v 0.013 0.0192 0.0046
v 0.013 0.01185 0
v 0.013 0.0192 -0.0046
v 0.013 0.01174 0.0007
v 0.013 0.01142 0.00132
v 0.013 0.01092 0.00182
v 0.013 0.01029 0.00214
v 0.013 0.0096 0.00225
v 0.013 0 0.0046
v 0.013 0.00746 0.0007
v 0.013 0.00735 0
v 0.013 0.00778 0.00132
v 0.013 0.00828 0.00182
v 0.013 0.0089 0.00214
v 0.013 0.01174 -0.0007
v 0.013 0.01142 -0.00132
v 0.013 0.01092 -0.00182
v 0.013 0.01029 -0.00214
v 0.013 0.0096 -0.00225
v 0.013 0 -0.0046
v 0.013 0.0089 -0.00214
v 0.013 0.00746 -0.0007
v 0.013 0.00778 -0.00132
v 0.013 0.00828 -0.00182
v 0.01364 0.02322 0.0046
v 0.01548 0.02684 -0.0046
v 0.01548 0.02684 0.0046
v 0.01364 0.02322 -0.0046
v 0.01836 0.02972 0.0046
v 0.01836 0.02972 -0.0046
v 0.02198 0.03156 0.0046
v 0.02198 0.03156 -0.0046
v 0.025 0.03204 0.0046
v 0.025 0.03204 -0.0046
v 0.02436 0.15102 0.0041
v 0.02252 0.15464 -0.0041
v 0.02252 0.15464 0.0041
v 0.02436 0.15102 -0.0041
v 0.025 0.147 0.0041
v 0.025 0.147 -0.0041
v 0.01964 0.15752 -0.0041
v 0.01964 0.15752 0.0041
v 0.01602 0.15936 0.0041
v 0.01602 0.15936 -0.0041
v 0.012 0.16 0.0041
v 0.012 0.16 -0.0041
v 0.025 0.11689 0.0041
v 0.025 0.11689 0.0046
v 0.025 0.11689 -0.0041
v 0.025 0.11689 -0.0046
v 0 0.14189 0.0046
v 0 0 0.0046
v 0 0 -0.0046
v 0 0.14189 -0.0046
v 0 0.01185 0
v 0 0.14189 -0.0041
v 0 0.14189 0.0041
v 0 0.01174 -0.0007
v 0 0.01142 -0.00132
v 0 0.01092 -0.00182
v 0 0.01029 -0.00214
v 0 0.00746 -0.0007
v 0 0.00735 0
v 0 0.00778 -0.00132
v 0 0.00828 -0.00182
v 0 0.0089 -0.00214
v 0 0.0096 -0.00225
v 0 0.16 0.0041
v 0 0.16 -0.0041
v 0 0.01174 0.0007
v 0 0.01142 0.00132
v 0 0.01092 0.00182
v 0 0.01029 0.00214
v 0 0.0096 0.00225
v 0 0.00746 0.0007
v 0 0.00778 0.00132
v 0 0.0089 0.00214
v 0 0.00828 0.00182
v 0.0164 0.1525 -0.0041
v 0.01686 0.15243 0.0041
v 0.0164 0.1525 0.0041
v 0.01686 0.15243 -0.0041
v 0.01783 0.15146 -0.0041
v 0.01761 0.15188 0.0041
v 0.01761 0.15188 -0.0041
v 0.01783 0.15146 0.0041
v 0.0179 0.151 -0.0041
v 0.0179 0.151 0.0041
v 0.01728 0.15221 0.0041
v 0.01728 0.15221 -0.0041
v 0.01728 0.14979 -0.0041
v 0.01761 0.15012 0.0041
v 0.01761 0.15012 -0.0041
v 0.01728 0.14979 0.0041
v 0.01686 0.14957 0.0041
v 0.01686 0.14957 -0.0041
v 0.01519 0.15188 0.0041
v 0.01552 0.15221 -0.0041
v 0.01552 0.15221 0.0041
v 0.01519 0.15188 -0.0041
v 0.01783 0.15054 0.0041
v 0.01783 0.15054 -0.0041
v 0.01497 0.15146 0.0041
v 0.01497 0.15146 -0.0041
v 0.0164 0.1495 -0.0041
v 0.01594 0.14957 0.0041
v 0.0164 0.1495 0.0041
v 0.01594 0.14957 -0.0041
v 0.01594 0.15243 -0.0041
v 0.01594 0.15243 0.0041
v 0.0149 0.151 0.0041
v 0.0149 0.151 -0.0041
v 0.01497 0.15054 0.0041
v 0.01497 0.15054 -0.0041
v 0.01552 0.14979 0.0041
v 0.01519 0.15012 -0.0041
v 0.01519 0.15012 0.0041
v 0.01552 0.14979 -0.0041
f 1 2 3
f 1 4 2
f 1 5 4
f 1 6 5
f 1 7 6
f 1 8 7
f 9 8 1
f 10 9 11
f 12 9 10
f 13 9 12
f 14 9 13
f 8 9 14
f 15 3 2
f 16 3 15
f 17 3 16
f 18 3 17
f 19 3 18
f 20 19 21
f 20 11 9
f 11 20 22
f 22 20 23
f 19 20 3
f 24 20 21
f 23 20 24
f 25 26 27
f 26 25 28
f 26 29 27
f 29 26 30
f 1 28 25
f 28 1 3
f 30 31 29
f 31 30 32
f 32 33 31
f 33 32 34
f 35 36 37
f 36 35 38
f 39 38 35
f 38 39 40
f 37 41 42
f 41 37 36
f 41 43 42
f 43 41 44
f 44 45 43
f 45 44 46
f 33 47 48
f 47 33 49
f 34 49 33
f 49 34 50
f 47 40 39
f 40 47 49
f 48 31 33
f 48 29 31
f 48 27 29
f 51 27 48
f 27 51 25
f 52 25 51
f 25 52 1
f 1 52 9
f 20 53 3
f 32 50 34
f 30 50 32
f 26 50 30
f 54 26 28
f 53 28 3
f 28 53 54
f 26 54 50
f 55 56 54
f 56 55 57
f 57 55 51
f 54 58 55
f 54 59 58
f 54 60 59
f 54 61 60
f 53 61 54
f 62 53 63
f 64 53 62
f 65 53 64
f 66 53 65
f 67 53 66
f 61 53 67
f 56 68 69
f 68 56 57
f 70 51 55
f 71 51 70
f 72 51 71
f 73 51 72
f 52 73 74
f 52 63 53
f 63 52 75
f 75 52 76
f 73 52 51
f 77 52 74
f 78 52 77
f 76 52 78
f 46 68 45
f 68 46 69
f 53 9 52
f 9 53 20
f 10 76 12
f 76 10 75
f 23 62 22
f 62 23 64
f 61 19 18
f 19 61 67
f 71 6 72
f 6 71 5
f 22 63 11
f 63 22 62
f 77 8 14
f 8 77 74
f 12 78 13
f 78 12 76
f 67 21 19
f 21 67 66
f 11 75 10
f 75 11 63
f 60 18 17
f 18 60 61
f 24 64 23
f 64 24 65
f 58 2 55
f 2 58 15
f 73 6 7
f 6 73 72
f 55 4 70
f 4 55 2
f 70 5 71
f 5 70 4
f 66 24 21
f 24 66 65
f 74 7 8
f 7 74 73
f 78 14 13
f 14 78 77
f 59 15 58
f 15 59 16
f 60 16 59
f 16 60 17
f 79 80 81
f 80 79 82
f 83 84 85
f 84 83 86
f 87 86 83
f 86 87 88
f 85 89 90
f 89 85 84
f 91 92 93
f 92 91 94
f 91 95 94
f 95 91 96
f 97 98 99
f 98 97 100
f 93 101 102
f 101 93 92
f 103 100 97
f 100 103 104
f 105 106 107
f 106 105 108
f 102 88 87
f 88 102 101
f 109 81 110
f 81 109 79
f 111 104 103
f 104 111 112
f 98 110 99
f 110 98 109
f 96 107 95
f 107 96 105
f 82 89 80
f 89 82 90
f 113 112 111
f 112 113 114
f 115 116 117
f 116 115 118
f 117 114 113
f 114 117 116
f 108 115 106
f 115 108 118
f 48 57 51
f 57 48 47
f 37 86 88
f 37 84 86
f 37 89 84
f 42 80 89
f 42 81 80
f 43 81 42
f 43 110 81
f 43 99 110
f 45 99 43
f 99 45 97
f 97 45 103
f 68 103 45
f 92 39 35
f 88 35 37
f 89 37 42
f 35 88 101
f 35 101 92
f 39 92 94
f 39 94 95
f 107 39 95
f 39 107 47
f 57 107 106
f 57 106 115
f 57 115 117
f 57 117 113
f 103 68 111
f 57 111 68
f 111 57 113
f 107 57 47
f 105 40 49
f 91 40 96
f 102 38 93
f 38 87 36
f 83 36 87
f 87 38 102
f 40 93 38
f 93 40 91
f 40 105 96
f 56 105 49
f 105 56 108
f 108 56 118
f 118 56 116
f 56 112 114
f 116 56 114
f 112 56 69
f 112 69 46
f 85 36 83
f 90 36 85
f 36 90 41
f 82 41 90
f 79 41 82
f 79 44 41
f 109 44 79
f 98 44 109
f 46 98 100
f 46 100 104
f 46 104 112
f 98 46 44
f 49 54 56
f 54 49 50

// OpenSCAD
// file: chinook.scad
module chinook()
{
    difference()
    {
        base_cube(length);
        tab_cut();
        screw_cut();
        back_round_cut(length);
        pin_cut(length);
        thickness_cut(length, thick/2);
        thickness_cut(length, -thick/2);
    }
}

module base_cube(BaseLength)
{
    translate([0,0,-thick/2])
    cube(size=[height,
               BaseLength,
               thick],
         center=false);
}

module tab_cut()
{
    translate([tab_height,0,-thick/2*1.1])
    union()
    {
        translate([0,-thick,0])
        cube(size=[height,
                   tab_length+thick,
                   thick*1.1],
             center=false);
        translate([tab_round,tab_length,0])
        cylinder(h=thick*1.1,
                 r=tab_round,
                 center=false);
    }
}

module screw_cut()
{
    translate([tab_height/2,screw_pos,0])
    rotate([0,90,0])
    cylinder(h=tab_height*1.1,
             d=screw_dia,
             center=true);
}

module back_round_cut(BaseLength)
{
    translate([height-tab_round,
               BaseLength-tab_round,
               -thick/2*1.1])
    difference()
    {
        cube(size=[tab_round*1.1,
                   tab_round*1.1,
                   thick*1.1],
             center=false);
        cylinder(h=thick*1.2,
                 r=tab_round,
                 center=false);
    }
}

module pin_cut(BaseLength)
{
    translate([pin_depth,
               BaseLength-pin_back,
               0])
    rotate([0,0,0])
    cylinder(h=tab_height*1.1,
             d=pin_dia,
             center=true);
}

module thickness_cut(BaseLength, zOffset)
{
    translate([pin_depth,
               BaseLength-pin_back,
               zOffset])
    rotate([0,0,45])
    cube(size=[pin_depth*2.2,
               height*3,
               thick_cut],
         center=true);
}
// main file
// Dimensions in m (SI)
length = 0.16;
height = 0.025;
thick  = 0.0092;

screw_pos = 0.0096;
screw_dia = 0.0045;

tab_height = 0.013;
tab_length = screw_pos * 2;
tab_round  = tab_height;

// real pin: d=0.0048 -> drill to fit
pin_dia   = 0.003;
pin_depth = 0.0164;
pin_back  = 0.009;

// Thickness to cut for easier sliding (0 for no cut)
thick_cut = 0.001;

// face resolution for curved surfaces
$fn=20;

// instantiate
include <chinook.scad>
chinook();
